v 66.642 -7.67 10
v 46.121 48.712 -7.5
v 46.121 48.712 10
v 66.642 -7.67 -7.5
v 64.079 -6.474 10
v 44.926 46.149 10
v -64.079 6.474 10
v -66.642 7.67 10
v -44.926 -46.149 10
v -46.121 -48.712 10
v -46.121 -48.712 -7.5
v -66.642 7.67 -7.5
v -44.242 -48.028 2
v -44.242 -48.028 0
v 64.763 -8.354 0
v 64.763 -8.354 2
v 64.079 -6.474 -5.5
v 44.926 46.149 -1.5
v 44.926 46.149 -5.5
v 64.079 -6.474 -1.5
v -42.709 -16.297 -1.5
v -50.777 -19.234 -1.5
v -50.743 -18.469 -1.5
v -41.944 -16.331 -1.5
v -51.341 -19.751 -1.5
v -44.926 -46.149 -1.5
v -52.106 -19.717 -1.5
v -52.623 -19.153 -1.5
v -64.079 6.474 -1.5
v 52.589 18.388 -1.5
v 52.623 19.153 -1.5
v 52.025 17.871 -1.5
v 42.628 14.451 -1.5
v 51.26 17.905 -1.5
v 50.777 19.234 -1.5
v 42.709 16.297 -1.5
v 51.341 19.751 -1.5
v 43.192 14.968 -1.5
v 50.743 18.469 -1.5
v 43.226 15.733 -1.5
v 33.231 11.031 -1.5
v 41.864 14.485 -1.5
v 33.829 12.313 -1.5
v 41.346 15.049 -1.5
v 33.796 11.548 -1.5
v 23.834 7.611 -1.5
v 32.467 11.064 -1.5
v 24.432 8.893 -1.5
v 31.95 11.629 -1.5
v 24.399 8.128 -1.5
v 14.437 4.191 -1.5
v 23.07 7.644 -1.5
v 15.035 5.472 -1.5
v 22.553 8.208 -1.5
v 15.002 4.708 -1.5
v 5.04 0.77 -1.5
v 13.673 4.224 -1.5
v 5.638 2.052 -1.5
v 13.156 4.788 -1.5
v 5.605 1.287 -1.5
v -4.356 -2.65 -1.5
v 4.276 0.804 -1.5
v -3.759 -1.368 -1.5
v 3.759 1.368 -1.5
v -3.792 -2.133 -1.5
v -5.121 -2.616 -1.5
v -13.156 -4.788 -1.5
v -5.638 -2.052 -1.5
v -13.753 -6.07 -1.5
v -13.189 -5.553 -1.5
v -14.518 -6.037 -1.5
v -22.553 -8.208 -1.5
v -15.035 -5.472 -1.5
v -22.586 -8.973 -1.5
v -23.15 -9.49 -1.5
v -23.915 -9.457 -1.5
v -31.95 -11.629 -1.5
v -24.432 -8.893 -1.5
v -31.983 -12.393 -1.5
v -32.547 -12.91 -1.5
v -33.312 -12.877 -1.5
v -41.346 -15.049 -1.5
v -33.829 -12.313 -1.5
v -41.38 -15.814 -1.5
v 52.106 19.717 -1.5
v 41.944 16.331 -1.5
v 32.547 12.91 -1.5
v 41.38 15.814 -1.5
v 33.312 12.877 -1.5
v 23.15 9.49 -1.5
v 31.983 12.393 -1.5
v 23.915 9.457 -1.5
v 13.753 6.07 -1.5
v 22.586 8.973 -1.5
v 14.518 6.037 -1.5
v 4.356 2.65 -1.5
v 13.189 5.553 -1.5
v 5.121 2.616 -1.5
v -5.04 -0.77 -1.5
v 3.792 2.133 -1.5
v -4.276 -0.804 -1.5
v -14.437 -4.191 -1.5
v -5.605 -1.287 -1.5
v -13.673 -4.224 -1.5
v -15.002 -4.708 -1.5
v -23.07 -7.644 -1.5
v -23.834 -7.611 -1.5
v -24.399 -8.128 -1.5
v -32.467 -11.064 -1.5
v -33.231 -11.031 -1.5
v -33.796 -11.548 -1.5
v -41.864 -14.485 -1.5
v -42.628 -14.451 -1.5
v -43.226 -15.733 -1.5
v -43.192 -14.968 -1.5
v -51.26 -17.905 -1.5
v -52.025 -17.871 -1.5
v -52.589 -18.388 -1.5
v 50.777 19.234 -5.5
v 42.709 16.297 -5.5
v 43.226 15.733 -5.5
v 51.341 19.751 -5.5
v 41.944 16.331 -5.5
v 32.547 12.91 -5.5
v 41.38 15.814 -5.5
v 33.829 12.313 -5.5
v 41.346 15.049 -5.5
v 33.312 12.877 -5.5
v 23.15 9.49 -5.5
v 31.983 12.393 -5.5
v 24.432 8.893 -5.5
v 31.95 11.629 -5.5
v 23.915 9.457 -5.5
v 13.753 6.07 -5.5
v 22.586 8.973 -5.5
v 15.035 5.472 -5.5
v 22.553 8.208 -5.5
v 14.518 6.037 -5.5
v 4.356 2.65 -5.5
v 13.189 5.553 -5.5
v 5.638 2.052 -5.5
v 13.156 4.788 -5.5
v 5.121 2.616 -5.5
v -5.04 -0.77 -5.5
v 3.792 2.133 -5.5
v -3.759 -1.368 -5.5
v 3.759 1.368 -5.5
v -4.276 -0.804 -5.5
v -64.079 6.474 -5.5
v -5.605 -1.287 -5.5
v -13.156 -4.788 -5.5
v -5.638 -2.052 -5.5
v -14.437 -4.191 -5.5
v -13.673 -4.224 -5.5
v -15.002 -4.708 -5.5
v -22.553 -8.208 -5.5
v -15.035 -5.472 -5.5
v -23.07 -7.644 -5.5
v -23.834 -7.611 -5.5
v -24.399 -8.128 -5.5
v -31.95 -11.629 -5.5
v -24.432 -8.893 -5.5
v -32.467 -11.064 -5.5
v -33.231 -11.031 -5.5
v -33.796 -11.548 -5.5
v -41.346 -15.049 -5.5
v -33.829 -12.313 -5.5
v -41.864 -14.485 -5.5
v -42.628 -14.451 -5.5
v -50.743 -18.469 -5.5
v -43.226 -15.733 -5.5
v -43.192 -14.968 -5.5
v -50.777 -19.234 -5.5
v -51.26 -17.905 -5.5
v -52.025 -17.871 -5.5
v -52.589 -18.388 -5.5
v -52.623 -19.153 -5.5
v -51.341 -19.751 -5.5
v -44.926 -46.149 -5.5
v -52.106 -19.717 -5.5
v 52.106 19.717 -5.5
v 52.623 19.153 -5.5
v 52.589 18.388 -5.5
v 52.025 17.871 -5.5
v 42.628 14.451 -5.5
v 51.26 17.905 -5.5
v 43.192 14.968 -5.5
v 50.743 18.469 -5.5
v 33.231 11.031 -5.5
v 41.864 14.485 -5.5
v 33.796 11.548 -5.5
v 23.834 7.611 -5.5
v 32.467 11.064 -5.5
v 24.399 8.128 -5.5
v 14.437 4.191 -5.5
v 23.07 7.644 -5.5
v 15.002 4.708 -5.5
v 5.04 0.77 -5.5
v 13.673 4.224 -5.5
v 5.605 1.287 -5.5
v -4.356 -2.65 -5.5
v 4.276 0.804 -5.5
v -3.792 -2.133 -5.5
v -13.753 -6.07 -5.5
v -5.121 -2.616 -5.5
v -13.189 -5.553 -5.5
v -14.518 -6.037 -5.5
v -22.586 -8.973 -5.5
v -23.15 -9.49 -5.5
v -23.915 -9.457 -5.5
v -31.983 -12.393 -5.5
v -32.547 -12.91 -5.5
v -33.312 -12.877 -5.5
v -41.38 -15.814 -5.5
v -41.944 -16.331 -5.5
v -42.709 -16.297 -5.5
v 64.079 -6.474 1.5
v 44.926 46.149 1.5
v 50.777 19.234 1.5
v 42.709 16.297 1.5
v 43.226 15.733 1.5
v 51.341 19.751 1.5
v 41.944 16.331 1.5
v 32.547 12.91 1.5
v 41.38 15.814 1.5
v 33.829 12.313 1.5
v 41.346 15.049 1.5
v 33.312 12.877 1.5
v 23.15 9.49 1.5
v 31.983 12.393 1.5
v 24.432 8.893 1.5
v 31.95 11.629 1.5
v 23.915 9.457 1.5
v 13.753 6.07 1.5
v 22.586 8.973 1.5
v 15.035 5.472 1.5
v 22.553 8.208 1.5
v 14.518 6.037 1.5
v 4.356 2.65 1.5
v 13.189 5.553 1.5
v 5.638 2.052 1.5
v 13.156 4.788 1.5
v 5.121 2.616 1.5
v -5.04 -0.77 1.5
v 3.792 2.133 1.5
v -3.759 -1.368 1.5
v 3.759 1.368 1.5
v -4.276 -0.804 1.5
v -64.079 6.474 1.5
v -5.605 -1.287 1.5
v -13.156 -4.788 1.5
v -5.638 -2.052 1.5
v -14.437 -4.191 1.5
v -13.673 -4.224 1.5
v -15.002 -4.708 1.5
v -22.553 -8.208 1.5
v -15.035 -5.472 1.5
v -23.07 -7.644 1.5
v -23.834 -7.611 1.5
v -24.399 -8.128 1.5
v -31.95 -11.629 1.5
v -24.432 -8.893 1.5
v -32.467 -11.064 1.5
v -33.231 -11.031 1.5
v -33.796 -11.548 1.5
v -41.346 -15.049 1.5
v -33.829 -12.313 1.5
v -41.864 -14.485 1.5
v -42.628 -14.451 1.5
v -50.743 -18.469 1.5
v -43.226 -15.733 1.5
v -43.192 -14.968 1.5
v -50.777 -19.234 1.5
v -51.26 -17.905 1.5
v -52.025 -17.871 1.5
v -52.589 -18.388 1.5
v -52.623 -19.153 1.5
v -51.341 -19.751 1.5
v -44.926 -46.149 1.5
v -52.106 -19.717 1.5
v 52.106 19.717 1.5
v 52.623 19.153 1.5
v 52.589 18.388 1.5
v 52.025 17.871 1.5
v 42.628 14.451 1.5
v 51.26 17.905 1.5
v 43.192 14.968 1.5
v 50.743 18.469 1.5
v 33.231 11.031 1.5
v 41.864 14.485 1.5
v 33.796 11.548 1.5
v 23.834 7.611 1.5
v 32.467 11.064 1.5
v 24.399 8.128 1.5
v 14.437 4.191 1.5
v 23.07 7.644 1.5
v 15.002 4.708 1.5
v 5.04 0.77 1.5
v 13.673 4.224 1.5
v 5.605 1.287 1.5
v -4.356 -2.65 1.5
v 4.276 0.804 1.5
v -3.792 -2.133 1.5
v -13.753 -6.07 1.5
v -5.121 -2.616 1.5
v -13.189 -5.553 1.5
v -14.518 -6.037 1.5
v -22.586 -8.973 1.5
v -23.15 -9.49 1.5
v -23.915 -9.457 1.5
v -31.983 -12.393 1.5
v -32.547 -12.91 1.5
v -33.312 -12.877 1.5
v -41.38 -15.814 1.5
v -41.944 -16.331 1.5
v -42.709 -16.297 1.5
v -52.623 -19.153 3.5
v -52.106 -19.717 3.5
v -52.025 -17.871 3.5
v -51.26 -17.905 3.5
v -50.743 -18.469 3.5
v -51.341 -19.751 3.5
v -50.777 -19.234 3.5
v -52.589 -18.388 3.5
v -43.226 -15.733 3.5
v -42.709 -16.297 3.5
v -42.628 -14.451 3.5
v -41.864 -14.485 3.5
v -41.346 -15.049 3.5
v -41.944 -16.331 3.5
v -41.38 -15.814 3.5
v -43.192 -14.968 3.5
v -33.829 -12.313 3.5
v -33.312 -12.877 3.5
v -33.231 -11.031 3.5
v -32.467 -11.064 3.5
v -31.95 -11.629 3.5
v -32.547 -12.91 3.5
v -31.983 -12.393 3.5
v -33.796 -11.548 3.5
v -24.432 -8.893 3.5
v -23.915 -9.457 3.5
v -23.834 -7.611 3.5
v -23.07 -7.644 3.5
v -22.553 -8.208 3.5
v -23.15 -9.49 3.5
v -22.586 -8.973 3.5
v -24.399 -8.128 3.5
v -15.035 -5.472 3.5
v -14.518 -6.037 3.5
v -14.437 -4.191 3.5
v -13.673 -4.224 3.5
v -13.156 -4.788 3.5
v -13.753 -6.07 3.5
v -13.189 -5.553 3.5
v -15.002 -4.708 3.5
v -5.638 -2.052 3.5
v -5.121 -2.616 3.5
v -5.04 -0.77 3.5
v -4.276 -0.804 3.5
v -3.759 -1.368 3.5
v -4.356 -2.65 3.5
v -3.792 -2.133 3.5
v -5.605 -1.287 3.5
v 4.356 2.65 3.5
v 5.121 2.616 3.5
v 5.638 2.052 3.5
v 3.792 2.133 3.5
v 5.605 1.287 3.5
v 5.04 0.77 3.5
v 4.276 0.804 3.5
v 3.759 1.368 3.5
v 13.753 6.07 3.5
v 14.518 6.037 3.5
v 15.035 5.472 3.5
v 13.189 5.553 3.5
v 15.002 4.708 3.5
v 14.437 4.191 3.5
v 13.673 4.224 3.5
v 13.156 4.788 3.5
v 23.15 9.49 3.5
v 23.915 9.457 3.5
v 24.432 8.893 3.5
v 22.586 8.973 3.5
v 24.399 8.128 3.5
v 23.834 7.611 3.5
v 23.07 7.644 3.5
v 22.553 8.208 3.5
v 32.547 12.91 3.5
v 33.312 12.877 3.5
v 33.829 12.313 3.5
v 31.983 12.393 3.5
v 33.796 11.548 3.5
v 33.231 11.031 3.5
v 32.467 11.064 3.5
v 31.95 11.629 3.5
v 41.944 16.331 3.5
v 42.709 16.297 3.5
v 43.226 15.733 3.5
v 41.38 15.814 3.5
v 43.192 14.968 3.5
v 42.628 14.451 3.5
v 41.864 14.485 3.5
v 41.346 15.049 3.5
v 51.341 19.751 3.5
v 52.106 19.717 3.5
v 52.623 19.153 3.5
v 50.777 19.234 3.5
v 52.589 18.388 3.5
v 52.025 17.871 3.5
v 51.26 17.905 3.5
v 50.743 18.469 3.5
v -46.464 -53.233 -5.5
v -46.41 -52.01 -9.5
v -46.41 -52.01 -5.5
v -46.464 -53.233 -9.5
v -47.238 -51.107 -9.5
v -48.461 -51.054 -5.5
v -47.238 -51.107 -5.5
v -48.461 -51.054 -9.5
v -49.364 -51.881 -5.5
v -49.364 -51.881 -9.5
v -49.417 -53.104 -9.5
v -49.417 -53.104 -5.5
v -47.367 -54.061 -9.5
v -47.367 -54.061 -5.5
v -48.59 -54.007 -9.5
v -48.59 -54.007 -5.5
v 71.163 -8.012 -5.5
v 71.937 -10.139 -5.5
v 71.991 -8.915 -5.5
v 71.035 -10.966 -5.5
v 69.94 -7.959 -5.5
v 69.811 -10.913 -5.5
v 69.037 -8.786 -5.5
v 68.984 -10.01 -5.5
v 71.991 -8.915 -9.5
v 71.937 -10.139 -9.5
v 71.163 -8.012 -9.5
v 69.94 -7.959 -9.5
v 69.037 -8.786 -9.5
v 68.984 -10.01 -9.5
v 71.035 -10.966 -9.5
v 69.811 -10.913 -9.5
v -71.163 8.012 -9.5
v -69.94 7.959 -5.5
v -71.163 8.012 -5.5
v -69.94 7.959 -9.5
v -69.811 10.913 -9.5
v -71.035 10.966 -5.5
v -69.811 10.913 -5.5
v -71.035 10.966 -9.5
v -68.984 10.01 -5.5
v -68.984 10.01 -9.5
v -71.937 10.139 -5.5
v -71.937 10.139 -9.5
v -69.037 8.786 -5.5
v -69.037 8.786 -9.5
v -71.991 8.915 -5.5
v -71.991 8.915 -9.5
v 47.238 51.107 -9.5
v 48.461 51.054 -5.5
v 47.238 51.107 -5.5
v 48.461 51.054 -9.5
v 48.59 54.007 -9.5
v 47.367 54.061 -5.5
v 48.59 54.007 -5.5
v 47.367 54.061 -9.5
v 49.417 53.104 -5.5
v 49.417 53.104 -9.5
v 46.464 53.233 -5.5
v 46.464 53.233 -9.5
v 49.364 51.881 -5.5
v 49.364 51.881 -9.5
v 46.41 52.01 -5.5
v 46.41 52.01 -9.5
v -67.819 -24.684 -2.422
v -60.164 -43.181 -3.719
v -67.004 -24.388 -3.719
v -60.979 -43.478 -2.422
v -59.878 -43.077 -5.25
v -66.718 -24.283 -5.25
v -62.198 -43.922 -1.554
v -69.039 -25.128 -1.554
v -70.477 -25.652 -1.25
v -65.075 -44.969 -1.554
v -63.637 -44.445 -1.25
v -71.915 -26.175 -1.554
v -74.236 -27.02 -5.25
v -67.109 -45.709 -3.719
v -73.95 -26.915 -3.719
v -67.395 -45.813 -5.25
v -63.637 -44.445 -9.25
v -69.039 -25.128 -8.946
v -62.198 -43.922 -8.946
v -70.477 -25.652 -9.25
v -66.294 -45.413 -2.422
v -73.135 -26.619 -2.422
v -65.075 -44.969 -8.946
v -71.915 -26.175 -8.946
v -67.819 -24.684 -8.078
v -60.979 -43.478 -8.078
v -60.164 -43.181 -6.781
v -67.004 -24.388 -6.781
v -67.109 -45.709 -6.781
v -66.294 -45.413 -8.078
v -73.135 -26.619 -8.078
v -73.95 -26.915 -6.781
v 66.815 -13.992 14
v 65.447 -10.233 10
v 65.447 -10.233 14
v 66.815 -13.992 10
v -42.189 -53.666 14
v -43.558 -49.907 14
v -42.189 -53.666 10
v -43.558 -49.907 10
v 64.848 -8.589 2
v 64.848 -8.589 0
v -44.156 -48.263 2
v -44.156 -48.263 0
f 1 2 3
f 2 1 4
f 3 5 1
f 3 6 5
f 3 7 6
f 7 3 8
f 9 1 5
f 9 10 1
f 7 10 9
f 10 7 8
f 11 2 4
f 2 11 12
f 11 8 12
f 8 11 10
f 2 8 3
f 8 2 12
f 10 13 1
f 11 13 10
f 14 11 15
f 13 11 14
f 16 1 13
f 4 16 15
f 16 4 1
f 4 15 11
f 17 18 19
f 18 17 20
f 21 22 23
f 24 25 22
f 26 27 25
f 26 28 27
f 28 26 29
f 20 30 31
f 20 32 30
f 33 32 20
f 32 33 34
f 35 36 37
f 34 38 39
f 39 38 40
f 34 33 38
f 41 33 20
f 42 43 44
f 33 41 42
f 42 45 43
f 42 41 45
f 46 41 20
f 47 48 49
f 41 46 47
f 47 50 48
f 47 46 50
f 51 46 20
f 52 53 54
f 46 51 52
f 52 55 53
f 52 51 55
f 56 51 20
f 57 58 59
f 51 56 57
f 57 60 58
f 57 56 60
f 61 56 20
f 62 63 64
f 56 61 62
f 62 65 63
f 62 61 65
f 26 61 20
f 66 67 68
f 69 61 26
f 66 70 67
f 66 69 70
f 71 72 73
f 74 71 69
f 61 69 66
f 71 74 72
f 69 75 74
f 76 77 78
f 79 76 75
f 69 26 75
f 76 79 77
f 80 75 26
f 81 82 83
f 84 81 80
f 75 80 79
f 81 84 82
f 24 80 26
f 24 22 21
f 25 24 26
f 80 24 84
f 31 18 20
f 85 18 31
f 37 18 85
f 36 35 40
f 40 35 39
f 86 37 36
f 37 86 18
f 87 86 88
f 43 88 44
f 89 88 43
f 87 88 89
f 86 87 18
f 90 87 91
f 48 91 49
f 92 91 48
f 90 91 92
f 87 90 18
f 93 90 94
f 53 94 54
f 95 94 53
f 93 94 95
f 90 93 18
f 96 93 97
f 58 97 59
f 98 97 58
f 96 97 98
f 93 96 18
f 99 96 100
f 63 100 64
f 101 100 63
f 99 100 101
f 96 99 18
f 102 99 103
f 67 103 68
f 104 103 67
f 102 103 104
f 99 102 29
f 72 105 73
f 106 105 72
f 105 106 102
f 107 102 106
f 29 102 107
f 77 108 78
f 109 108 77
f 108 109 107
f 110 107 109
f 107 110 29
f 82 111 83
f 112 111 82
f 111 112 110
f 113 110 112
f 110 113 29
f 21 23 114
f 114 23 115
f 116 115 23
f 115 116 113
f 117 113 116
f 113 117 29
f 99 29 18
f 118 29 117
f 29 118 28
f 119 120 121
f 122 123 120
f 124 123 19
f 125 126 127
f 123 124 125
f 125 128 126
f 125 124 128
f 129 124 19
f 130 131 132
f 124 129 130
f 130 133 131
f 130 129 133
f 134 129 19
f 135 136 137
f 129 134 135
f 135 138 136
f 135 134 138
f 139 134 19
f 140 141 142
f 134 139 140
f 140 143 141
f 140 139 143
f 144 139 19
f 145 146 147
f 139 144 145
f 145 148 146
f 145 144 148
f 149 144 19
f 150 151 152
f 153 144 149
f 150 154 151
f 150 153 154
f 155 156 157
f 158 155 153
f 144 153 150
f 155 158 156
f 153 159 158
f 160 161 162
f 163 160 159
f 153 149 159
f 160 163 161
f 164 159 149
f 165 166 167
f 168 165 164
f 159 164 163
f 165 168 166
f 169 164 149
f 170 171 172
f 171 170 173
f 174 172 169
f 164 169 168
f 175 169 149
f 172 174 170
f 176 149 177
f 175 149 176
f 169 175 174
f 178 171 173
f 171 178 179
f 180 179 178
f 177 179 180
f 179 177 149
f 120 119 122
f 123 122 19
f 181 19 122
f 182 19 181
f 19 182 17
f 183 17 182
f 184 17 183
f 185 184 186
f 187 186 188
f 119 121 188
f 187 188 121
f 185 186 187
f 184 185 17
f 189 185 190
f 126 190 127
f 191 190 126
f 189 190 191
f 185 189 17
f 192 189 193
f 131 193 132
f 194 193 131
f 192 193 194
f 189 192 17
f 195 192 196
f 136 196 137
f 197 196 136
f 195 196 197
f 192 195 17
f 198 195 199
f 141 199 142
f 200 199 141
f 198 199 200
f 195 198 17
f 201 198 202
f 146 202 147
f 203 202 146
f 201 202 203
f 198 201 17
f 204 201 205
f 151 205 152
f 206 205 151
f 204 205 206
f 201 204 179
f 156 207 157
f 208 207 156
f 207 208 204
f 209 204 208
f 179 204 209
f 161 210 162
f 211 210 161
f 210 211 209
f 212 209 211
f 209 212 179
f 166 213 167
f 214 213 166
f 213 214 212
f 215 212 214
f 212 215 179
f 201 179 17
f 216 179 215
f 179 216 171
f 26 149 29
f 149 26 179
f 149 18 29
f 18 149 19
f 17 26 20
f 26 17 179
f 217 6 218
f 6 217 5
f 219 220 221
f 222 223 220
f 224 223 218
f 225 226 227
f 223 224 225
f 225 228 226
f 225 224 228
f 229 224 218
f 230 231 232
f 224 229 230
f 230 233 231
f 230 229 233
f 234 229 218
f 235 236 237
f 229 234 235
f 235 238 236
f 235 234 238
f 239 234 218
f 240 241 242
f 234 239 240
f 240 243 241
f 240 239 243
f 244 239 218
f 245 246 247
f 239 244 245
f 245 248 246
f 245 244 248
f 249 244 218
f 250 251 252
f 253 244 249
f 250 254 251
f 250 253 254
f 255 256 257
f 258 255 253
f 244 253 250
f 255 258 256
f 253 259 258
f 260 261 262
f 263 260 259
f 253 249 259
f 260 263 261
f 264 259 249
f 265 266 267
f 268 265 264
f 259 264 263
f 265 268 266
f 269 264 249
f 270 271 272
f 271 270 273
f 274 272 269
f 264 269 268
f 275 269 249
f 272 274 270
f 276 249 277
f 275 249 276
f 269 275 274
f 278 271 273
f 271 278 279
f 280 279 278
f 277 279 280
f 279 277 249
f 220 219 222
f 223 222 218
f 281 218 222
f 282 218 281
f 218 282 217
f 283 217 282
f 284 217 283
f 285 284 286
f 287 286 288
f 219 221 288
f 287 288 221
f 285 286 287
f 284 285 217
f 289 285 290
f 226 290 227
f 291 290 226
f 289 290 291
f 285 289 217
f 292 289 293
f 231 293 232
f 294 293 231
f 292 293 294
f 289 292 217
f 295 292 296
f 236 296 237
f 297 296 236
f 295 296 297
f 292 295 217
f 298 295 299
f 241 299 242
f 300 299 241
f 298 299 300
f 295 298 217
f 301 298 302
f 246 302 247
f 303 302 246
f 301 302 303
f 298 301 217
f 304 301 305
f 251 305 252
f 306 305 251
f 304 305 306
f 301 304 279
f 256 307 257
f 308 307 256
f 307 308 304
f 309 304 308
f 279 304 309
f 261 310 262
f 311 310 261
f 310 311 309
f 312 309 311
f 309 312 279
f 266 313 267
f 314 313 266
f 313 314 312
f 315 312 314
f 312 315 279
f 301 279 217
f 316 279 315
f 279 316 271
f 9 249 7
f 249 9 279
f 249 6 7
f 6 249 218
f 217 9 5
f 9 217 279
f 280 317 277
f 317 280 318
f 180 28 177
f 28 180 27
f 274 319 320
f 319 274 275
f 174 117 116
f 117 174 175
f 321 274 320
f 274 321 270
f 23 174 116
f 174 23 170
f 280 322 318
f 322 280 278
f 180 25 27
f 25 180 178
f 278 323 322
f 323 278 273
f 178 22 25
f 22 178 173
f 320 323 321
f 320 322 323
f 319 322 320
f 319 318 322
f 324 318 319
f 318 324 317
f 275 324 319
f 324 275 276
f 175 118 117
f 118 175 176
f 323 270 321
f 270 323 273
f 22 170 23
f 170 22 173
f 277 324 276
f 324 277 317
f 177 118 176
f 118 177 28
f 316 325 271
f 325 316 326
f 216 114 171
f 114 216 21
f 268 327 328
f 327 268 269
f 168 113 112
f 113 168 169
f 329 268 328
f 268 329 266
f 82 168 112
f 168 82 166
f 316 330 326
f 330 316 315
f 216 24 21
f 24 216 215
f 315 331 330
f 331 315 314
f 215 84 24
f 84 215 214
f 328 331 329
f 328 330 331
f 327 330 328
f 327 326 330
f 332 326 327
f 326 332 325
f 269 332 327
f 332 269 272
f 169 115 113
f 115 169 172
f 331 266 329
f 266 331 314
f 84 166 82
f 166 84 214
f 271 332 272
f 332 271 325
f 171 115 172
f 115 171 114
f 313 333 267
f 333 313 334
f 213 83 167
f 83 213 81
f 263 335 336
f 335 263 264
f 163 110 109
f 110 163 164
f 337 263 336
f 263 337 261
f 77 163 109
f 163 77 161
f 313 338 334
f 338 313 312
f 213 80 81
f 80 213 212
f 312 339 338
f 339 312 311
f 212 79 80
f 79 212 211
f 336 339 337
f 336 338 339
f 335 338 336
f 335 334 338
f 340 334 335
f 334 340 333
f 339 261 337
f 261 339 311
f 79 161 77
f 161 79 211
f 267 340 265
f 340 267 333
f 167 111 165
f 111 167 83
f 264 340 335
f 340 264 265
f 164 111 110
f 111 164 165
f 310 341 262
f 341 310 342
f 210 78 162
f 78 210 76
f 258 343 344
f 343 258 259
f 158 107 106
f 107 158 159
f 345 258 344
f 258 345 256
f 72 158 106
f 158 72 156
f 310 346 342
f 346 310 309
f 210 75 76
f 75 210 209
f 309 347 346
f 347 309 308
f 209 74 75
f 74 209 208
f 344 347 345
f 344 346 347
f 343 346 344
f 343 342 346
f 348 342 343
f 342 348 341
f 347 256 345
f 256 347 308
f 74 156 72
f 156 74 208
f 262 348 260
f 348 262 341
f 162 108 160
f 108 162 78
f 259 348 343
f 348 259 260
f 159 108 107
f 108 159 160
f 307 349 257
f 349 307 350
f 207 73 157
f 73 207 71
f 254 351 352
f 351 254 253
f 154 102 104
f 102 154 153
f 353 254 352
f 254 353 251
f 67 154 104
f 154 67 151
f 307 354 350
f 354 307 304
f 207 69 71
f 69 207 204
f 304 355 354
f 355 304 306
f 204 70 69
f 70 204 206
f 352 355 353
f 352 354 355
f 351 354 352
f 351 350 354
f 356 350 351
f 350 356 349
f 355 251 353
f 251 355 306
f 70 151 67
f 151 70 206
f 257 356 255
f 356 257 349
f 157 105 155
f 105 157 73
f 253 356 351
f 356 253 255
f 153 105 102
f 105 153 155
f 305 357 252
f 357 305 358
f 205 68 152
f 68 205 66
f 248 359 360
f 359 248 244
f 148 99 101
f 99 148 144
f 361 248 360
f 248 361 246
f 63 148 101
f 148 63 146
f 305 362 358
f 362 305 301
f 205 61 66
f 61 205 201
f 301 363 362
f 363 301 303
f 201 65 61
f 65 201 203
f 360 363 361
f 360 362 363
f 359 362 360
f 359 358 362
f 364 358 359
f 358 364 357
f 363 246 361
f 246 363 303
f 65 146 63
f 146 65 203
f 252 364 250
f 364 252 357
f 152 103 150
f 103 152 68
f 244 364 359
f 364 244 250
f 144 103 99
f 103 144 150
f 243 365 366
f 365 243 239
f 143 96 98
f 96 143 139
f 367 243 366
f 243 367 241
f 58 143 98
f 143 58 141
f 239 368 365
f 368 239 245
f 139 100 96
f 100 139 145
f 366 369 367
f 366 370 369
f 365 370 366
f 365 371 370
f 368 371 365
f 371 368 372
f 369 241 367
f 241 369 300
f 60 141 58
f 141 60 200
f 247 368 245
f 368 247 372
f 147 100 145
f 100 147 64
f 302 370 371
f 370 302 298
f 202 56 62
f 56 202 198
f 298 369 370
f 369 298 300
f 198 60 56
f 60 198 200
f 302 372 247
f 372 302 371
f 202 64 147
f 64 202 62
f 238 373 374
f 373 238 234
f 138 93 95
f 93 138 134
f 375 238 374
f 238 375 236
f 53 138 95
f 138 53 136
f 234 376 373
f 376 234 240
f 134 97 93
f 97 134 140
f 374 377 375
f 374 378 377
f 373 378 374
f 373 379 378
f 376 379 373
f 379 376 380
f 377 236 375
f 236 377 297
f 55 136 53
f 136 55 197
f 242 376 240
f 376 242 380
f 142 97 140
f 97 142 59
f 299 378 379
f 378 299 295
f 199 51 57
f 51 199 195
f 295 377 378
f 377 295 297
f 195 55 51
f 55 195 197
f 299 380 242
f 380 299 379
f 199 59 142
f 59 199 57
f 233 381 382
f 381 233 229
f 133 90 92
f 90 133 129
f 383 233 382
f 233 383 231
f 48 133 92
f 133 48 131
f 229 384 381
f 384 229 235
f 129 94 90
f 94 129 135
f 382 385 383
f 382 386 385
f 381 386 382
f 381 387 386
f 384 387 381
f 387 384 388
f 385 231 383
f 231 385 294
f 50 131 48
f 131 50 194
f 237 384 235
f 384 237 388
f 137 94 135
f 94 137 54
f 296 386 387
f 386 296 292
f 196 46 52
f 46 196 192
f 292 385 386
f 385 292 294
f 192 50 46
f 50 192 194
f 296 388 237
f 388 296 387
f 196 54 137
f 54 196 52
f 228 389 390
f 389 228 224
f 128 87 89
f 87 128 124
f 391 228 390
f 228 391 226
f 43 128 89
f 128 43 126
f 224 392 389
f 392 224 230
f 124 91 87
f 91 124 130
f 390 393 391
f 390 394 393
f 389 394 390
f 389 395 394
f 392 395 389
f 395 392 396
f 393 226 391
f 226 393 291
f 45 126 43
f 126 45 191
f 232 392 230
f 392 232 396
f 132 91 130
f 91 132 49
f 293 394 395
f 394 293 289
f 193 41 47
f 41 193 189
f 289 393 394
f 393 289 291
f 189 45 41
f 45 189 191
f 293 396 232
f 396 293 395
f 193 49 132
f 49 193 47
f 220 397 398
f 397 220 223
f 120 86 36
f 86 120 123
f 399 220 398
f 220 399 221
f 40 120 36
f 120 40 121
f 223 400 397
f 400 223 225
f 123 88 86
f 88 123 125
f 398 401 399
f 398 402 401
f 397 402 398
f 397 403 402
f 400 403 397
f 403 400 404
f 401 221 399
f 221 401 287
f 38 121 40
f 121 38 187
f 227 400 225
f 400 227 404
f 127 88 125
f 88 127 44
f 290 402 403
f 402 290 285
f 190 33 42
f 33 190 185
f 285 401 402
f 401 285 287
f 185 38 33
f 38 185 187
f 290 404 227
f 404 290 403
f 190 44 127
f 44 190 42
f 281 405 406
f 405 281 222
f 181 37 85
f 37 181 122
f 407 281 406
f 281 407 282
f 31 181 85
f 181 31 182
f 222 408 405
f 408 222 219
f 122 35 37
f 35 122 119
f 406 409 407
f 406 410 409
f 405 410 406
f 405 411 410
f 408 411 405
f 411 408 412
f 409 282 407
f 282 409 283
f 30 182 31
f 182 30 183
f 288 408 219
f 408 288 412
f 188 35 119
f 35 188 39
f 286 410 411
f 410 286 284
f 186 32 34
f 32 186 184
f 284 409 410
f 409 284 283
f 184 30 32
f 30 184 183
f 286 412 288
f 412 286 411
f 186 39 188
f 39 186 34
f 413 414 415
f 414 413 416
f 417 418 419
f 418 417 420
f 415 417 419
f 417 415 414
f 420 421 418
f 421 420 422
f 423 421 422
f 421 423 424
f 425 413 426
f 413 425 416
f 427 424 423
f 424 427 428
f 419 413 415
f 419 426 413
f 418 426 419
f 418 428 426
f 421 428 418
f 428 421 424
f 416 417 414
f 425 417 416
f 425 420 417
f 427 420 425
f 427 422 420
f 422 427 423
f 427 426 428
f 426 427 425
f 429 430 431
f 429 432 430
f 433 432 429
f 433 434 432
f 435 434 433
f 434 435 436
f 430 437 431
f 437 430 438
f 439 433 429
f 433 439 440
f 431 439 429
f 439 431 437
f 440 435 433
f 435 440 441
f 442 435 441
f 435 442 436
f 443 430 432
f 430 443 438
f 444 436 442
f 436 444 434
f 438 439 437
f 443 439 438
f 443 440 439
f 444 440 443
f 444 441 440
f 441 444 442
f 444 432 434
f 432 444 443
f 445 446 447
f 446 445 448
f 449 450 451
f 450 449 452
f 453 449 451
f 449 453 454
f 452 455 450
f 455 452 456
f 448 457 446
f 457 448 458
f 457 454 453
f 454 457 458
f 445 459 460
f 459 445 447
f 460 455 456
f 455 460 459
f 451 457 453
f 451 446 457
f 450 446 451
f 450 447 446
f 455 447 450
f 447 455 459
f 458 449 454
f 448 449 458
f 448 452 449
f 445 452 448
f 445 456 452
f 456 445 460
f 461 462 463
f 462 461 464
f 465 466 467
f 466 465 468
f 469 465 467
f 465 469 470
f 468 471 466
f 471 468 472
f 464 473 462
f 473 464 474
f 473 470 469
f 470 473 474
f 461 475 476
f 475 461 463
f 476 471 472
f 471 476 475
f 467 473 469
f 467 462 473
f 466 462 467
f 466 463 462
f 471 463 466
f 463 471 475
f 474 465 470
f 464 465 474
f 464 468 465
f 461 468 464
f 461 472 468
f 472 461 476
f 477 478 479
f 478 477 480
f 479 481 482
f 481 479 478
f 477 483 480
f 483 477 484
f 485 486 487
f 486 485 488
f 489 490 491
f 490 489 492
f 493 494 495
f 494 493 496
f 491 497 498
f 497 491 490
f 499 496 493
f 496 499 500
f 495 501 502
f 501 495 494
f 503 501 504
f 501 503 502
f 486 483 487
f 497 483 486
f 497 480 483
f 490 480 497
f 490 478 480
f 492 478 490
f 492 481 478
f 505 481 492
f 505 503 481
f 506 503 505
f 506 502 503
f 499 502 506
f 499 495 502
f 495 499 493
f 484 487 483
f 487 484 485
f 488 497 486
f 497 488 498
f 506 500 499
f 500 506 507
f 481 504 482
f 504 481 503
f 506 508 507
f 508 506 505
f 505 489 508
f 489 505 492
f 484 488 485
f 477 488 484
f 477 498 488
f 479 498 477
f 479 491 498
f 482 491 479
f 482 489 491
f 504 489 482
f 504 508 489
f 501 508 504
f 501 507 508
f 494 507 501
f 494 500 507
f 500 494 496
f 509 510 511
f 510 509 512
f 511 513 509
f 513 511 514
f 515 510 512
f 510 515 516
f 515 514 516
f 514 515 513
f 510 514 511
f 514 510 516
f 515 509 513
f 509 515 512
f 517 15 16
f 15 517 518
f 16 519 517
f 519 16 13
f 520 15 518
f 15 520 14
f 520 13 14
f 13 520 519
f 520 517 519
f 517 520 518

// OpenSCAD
// Two-Stage Density Sorting Channel — Stage 1
// HUSKY-SORTER-001 | Topic 4 Day 2 | 2026-04-14
// Fan: 5015 (120 L/min) -> 60x10mm -> 2-way separation
// Design: theta=20deg, PWM=80%, v_air~254cm/s
//
// v2 2026-05-17: Plenum moved BELOW channel, nozzles blow UPWARD through floor
// Previous: plenum was on side wall, nozzles blew sideways (rotate[90,0,0] error)

channel_L   = 120;
channel_W   = 60;
channel_H   = 10;
wall        = 2;
plenum_W    = 15;
plenum_H    = 6;
floor_H     = 1.5;
slope_deg   = 20;
baffle_H    = 4;  // top baffle for light-bean escape

rotate([0, 0, slope_deg]) {
    difference() {
        // Outer shell
        translate([-channel_L/2, -channel_W/2, -(plenum_H + floor_H)])
            cube([channel_L, channel_W, channel_H + floor_H + plenum_H]);

        // Plenum cavity (bottom section)
        translate([-channel_L/2+wall, -channel_W/2+wall, -plenum_H-floor_H+wall])
            cube([channel_L-2*wall, channel_W-2*wall, plenum_H-wall]);

        // Channel interior (above floor)
        translate([-channel_L/2+wall, -channel_W/2+wall, floor_H])
            cube([channel_L-2*wall, channel_W-2*wall, channel_H]);
    }

    // Nozzle holes: vertical (Z-axis) through floor — 12x phi2mm
    for (i=[0:11]) {
        x = -channel_L/2 + (i+0.5)*(channel_L/12);
        translate([x, 0, -plenum_H])
            cylinder(h=plenum_H + floor_H + 2, d=2.0, $fn=8);
    }

    // Air inlet: horizontal into plenum from front face
    translate([-channel_L/2-15, 0, -(plenum_H+floor_H)/2 - floor_H])
        rotate([90, 0, 0]) cylinder(h=20, d=8, $fn=16);

    // Top escape baffle (at channel TOP, not bottom)
    translate([-channel_L/2+2, -channel_W/2-wall-baffle_H, channel_H])
        cube([channel_L-4, baffle_H, baffle_H]);

    // Bottom guide ridge
    translate([-channel_L/2+2, -channel_W/2-0.25, 0])
        cube([channel_L-4, 0.5, 2]);

    // Mounting flanges 4x M3
    for (pt=[[-channel_L/2-3,-channel_W/2-3],[ channel_L/2+3,-channel_W/2-3],
              [-channel_L/2-3, channel_W/2+3],[ channel_L/2+3, channel_W/2+3]])
        translate([pt[0], pt[1], -(plenum_H+floor_H)-2])
            cylinder(h=4, d=3.2, $fn=8);
}
echo(str("Stage-1 v2: 60x10mm, theta=20deg, 5015 fan, v_air~", 254, "cm/s @80% PWM, plenum-below"));
